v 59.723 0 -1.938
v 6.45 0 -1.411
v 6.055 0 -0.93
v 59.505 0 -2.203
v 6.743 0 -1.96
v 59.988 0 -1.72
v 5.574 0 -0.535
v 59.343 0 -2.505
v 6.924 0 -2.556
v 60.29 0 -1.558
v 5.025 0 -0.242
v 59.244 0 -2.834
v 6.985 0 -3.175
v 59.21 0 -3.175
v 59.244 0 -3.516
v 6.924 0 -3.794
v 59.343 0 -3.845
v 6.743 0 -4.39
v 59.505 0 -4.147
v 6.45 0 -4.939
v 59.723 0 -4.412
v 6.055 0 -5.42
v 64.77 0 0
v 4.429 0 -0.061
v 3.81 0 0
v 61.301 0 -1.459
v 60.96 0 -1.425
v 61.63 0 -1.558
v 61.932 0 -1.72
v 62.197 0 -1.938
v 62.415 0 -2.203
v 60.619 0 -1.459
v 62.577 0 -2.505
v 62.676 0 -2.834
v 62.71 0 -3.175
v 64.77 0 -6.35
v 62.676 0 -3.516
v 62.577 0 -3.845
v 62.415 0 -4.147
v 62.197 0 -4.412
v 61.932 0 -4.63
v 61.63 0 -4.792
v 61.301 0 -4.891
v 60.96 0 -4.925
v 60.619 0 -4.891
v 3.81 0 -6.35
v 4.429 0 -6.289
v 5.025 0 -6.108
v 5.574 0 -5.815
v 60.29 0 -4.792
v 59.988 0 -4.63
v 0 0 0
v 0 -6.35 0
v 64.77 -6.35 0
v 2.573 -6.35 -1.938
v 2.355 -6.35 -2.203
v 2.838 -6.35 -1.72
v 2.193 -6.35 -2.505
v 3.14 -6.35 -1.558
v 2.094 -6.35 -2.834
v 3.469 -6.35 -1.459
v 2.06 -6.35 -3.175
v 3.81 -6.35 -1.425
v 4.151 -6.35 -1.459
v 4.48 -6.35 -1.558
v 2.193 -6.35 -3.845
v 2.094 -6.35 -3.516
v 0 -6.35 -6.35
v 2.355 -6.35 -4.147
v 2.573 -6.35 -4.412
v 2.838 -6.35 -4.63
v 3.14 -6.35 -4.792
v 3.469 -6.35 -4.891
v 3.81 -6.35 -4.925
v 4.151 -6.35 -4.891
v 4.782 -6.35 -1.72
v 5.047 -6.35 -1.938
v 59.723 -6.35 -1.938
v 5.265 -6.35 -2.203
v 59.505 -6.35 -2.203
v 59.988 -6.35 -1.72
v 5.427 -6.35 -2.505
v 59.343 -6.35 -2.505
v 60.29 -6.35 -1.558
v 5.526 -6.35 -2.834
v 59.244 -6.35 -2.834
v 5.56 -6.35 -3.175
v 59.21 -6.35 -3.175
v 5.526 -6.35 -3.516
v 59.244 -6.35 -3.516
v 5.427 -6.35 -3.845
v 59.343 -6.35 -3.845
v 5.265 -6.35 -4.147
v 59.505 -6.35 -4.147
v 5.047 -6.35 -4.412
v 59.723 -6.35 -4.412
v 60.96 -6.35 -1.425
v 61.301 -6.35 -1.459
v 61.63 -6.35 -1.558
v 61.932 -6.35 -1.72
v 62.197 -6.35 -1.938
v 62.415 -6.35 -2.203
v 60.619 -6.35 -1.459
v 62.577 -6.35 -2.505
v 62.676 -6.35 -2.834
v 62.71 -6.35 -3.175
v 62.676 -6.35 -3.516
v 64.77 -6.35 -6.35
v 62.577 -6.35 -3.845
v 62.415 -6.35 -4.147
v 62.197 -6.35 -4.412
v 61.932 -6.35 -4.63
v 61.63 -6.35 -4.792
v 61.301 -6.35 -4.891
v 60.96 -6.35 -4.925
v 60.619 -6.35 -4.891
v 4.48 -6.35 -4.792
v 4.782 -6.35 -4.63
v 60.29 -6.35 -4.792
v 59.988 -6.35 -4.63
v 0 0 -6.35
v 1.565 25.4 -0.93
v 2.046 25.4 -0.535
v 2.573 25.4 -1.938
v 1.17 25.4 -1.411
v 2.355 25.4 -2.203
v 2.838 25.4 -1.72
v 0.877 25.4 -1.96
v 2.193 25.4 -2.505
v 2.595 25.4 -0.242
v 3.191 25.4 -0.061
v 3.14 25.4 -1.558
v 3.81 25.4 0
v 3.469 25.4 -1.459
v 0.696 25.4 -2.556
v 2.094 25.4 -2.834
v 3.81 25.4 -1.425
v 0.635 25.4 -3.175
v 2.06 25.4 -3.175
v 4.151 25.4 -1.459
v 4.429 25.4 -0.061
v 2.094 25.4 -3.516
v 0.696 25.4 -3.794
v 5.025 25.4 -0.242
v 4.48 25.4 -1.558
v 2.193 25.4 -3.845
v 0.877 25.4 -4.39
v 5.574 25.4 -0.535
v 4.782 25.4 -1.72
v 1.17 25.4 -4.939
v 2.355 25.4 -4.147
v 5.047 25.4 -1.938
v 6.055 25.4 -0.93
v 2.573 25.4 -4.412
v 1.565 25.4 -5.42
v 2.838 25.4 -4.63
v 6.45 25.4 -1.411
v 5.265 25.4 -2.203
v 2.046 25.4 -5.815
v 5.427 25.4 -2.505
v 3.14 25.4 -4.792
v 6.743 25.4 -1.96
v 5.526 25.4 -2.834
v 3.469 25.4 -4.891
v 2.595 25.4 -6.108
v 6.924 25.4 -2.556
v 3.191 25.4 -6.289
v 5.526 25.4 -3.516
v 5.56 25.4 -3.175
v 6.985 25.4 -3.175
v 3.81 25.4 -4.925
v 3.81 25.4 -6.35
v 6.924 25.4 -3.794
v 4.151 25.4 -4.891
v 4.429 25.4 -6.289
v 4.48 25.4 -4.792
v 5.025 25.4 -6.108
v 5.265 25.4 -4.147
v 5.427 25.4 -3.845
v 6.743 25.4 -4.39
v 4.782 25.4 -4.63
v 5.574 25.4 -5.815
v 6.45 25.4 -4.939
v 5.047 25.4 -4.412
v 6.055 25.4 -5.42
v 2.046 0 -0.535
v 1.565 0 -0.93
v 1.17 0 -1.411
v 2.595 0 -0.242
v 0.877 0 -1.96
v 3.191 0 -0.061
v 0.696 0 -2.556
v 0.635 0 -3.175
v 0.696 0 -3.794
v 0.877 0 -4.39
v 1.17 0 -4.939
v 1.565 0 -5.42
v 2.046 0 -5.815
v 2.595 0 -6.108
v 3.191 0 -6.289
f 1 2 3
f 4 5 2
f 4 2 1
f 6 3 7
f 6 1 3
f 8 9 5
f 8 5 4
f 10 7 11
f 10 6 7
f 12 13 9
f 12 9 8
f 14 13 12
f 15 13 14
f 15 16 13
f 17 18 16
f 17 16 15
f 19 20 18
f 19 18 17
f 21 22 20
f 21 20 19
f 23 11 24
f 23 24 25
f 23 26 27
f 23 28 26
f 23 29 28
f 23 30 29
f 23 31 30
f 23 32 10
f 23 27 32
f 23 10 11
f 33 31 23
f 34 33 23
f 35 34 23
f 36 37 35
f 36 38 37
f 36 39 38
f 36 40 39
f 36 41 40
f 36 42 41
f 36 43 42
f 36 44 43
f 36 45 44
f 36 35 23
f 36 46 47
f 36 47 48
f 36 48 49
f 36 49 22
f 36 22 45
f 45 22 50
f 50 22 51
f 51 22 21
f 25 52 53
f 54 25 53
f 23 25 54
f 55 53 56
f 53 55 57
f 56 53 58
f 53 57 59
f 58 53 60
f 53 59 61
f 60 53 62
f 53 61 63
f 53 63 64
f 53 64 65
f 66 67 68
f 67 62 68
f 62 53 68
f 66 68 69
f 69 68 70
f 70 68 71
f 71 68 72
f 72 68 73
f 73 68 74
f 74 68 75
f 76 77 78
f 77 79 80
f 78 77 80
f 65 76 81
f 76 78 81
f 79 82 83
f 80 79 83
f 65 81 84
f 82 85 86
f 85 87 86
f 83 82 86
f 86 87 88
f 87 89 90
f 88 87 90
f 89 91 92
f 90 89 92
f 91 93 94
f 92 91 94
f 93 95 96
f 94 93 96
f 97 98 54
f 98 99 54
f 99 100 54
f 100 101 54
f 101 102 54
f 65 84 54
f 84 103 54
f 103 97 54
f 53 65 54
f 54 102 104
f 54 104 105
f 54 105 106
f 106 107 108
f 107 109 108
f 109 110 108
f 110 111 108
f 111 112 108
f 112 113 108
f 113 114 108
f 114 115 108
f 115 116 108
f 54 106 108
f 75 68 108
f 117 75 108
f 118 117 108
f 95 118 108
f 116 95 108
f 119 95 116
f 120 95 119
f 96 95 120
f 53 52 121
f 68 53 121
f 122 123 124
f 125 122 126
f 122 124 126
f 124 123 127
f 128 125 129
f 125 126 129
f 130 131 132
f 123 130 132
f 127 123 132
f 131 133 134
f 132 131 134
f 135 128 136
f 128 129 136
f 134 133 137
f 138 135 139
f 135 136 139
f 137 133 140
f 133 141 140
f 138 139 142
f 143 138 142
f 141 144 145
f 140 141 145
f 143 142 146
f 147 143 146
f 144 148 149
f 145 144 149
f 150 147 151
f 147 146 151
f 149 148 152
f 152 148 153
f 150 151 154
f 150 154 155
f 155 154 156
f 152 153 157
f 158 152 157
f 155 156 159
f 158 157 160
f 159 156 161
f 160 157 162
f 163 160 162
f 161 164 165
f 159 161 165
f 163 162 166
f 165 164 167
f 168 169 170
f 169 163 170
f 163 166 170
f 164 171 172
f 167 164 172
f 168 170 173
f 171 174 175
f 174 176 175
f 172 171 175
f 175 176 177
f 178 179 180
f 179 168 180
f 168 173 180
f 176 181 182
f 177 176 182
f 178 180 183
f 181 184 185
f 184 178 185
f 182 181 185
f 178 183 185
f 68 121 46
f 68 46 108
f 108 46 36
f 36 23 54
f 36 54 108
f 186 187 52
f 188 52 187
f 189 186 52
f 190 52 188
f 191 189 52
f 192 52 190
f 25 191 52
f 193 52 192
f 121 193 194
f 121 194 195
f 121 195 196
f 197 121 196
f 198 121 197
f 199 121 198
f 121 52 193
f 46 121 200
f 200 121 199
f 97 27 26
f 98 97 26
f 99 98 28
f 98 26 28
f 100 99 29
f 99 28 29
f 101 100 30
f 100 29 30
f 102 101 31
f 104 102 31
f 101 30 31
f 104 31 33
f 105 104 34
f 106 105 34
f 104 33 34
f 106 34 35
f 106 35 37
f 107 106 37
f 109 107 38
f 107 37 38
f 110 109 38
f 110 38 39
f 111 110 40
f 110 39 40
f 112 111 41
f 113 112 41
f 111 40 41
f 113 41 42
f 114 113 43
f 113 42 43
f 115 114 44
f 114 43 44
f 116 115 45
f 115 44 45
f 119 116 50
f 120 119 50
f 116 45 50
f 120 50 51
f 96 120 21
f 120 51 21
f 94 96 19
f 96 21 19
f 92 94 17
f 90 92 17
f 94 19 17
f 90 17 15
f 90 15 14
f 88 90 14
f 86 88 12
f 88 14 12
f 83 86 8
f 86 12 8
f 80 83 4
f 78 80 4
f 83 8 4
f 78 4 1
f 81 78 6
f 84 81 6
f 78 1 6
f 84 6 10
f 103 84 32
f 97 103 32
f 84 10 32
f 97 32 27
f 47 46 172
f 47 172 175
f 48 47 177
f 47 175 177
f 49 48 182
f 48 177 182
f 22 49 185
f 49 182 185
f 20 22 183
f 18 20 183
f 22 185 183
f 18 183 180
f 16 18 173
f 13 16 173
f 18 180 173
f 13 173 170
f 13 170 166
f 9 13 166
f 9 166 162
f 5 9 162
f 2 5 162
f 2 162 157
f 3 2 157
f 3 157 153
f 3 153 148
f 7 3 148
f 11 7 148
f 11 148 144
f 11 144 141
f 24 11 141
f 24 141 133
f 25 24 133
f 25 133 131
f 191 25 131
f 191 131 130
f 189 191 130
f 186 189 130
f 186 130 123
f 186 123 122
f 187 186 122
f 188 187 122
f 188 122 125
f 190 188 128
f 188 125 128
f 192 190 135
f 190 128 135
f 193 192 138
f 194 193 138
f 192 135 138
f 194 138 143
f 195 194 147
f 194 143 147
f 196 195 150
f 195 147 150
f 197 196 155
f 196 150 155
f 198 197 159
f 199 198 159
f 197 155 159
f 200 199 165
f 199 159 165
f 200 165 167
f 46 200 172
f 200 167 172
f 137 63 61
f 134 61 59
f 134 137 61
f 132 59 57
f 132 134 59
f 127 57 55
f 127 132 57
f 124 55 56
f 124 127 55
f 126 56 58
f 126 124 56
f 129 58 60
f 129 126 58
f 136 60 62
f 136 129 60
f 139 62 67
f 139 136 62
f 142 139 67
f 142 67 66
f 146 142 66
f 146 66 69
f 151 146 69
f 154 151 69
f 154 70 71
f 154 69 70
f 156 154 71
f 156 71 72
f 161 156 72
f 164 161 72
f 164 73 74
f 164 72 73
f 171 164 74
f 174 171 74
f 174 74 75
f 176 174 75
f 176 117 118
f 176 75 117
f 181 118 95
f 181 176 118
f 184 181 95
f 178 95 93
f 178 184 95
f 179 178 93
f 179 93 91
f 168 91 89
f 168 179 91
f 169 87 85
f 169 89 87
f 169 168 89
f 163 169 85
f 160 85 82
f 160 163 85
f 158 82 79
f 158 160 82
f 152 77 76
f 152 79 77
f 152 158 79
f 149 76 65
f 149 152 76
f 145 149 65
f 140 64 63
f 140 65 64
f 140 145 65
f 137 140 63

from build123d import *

# Parameters (mm, degrees)
SKETCH1_W           = 64.77
SKETCH1_H           = 6.35
SKETCH1_R           = 1.75
BOSS_EXTRUDE1_DEPTH = 6.35
BOSS_EXTRUDE2_START = -31.75
SKETCH2_R           = 3.175
SKETCH2_R_2         = 1.75
BOSS_EXTRUDE2_DEPTH = 25.4


with BuildPart() as part:
    # Sketch1 → Boss-Extrude1 (new body)
    with BuildSketch(Plane(origin=(0, 0, 0), x_dir=(1, 0, 0), z_dir=(0, 1, 0))):
        with Locations((32.385, 3.175)):
            Rectangle(SKETCH1_W, SKETCH1_H)
        with Locations(Location((3.81, 3.175, 0), (0, 0, 270))):
            Circle(SKETCH1_R, mode=Mode.SUBTRACT)
        with Locations(Location((60.96, 3.175, 0), (0, 0, 270))):
            Circle(SKETCH1_R, mode=Mode.SUBTRACT)
    extrude(amount=-BOSS_EXTRUDE1_DEPTH)

    # Sketch2 → Boss-Extrude2 (add)
    with BuildSketch(Plane.XZ.offset(6.35).offset(BOSS_EXTRUDE2_START)):
        with Locations(Location((3.81, -3.175, 0), (0, 0, 270))):
            Circle(SKETCH2_R)
        with Locations(Location((3.81, -3.175, 0), (0, 0, 90))):
            Circle(SKETCH2_R_2, mode=Mode.SUBTRACT)
    extrude(amount=BOSS_EXTRUDE2_DEPTH)


solid = part.part
